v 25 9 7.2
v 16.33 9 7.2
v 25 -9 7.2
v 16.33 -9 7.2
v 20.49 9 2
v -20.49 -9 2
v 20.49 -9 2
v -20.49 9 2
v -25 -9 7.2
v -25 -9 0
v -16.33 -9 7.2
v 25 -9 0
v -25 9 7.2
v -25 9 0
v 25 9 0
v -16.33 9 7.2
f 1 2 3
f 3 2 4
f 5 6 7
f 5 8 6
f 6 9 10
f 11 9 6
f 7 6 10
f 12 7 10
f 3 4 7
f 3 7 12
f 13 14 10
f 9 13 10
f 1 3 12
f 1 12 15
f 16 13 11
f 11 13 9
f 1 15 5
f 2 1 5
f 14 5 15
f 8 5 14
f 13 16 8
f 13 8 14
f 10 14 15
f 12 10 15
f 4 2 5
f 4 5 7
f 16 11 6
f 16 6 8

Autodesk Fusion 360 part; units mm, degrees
ref_plane "工作平面1" through (0, 0, 0) normal (0, 0, 1) x (1, 0, 0)
sketch "草图1" plane through (0, 0, 0) normal (0, 0, 1) x (1, 0, 0)
  line L0 (-25, -9) -> (25, -9)
  line L1 (25, -9) -> (25, 9)
  line L2 (25, 9) -> (-25, 9)
  line L3 (-25, 9) -> (-25, -9)
extrude "Coupon base" add sketch "草图1" along normal blind 2
ref_plane "工作平面2" through (0, 0, 2) normal (0, 0, 1) x (1, 0, 0)
sketch "草图2" plane through (0, 0, 2) normal (0, 0, 1) x (1, 0, 0)
  line L0 (-25, -9) -> (-20.49, -9)
  line L1 (-20.49, -9) -> (-20.49, 9)
  line L2 (-20.49, 9) -> (-25, 9)
  line L3 (-25, 9) -> (-25, -9)
ref_plane "工作平面3" through (0, 0, 7.2) normal (0, 0, 1) x (1, 0, 0)
sketch "草图3" plane through (0, 0, 7.2) normal (0, 0, 1) x (1, 0, 0)
  line L0 (-25, -9) -> (-16.33, -9)
  line L1 (-16.33, -9) -> (-16.33, 9)
  line L2 (-16.33, 9) -> (-25, 9)
  line L3 (-25, 9) -> (-25, -9)
loft "Coupon dovetail rail" add profiles "草图2", "草图3" section 1 section 2
ref_plane "工作平面4" through (0, 0, 2) normal (0, 0, 1) x (1, 0, 0)
sketch "草图4" plane through (0, 0, 2) normal (0, 0, 1) x (1, 0, 0)
  line L0 (20.49, -9) -> (25, -9)
  line L1 (25, -9) -> (25, 9)
  line L2 (25, 9) -> (20.49, 9)
  line L3 (20.49, 9) -> (20.49, -9)
ref_plane "工作平面5" through (0, 0, 7.2) normal (0, 0, 1) x (1, 0, 0)
sketch "草图5" plane through (0, 0, 7.2) normal (0, 0, 1) x (1, 0, 0)
  line L0 (16.33, -9) -> (25, -9)
  line L1 (25, -9) -> (25, 9)
  line L2 (25, 9) -> (16.33, 9)
  line L3 (16.33, 9) -> (16.33, -9)
loft "Coupon dovetail rail (1)" add profiles "草图4", "草图5" section 1 section 2
